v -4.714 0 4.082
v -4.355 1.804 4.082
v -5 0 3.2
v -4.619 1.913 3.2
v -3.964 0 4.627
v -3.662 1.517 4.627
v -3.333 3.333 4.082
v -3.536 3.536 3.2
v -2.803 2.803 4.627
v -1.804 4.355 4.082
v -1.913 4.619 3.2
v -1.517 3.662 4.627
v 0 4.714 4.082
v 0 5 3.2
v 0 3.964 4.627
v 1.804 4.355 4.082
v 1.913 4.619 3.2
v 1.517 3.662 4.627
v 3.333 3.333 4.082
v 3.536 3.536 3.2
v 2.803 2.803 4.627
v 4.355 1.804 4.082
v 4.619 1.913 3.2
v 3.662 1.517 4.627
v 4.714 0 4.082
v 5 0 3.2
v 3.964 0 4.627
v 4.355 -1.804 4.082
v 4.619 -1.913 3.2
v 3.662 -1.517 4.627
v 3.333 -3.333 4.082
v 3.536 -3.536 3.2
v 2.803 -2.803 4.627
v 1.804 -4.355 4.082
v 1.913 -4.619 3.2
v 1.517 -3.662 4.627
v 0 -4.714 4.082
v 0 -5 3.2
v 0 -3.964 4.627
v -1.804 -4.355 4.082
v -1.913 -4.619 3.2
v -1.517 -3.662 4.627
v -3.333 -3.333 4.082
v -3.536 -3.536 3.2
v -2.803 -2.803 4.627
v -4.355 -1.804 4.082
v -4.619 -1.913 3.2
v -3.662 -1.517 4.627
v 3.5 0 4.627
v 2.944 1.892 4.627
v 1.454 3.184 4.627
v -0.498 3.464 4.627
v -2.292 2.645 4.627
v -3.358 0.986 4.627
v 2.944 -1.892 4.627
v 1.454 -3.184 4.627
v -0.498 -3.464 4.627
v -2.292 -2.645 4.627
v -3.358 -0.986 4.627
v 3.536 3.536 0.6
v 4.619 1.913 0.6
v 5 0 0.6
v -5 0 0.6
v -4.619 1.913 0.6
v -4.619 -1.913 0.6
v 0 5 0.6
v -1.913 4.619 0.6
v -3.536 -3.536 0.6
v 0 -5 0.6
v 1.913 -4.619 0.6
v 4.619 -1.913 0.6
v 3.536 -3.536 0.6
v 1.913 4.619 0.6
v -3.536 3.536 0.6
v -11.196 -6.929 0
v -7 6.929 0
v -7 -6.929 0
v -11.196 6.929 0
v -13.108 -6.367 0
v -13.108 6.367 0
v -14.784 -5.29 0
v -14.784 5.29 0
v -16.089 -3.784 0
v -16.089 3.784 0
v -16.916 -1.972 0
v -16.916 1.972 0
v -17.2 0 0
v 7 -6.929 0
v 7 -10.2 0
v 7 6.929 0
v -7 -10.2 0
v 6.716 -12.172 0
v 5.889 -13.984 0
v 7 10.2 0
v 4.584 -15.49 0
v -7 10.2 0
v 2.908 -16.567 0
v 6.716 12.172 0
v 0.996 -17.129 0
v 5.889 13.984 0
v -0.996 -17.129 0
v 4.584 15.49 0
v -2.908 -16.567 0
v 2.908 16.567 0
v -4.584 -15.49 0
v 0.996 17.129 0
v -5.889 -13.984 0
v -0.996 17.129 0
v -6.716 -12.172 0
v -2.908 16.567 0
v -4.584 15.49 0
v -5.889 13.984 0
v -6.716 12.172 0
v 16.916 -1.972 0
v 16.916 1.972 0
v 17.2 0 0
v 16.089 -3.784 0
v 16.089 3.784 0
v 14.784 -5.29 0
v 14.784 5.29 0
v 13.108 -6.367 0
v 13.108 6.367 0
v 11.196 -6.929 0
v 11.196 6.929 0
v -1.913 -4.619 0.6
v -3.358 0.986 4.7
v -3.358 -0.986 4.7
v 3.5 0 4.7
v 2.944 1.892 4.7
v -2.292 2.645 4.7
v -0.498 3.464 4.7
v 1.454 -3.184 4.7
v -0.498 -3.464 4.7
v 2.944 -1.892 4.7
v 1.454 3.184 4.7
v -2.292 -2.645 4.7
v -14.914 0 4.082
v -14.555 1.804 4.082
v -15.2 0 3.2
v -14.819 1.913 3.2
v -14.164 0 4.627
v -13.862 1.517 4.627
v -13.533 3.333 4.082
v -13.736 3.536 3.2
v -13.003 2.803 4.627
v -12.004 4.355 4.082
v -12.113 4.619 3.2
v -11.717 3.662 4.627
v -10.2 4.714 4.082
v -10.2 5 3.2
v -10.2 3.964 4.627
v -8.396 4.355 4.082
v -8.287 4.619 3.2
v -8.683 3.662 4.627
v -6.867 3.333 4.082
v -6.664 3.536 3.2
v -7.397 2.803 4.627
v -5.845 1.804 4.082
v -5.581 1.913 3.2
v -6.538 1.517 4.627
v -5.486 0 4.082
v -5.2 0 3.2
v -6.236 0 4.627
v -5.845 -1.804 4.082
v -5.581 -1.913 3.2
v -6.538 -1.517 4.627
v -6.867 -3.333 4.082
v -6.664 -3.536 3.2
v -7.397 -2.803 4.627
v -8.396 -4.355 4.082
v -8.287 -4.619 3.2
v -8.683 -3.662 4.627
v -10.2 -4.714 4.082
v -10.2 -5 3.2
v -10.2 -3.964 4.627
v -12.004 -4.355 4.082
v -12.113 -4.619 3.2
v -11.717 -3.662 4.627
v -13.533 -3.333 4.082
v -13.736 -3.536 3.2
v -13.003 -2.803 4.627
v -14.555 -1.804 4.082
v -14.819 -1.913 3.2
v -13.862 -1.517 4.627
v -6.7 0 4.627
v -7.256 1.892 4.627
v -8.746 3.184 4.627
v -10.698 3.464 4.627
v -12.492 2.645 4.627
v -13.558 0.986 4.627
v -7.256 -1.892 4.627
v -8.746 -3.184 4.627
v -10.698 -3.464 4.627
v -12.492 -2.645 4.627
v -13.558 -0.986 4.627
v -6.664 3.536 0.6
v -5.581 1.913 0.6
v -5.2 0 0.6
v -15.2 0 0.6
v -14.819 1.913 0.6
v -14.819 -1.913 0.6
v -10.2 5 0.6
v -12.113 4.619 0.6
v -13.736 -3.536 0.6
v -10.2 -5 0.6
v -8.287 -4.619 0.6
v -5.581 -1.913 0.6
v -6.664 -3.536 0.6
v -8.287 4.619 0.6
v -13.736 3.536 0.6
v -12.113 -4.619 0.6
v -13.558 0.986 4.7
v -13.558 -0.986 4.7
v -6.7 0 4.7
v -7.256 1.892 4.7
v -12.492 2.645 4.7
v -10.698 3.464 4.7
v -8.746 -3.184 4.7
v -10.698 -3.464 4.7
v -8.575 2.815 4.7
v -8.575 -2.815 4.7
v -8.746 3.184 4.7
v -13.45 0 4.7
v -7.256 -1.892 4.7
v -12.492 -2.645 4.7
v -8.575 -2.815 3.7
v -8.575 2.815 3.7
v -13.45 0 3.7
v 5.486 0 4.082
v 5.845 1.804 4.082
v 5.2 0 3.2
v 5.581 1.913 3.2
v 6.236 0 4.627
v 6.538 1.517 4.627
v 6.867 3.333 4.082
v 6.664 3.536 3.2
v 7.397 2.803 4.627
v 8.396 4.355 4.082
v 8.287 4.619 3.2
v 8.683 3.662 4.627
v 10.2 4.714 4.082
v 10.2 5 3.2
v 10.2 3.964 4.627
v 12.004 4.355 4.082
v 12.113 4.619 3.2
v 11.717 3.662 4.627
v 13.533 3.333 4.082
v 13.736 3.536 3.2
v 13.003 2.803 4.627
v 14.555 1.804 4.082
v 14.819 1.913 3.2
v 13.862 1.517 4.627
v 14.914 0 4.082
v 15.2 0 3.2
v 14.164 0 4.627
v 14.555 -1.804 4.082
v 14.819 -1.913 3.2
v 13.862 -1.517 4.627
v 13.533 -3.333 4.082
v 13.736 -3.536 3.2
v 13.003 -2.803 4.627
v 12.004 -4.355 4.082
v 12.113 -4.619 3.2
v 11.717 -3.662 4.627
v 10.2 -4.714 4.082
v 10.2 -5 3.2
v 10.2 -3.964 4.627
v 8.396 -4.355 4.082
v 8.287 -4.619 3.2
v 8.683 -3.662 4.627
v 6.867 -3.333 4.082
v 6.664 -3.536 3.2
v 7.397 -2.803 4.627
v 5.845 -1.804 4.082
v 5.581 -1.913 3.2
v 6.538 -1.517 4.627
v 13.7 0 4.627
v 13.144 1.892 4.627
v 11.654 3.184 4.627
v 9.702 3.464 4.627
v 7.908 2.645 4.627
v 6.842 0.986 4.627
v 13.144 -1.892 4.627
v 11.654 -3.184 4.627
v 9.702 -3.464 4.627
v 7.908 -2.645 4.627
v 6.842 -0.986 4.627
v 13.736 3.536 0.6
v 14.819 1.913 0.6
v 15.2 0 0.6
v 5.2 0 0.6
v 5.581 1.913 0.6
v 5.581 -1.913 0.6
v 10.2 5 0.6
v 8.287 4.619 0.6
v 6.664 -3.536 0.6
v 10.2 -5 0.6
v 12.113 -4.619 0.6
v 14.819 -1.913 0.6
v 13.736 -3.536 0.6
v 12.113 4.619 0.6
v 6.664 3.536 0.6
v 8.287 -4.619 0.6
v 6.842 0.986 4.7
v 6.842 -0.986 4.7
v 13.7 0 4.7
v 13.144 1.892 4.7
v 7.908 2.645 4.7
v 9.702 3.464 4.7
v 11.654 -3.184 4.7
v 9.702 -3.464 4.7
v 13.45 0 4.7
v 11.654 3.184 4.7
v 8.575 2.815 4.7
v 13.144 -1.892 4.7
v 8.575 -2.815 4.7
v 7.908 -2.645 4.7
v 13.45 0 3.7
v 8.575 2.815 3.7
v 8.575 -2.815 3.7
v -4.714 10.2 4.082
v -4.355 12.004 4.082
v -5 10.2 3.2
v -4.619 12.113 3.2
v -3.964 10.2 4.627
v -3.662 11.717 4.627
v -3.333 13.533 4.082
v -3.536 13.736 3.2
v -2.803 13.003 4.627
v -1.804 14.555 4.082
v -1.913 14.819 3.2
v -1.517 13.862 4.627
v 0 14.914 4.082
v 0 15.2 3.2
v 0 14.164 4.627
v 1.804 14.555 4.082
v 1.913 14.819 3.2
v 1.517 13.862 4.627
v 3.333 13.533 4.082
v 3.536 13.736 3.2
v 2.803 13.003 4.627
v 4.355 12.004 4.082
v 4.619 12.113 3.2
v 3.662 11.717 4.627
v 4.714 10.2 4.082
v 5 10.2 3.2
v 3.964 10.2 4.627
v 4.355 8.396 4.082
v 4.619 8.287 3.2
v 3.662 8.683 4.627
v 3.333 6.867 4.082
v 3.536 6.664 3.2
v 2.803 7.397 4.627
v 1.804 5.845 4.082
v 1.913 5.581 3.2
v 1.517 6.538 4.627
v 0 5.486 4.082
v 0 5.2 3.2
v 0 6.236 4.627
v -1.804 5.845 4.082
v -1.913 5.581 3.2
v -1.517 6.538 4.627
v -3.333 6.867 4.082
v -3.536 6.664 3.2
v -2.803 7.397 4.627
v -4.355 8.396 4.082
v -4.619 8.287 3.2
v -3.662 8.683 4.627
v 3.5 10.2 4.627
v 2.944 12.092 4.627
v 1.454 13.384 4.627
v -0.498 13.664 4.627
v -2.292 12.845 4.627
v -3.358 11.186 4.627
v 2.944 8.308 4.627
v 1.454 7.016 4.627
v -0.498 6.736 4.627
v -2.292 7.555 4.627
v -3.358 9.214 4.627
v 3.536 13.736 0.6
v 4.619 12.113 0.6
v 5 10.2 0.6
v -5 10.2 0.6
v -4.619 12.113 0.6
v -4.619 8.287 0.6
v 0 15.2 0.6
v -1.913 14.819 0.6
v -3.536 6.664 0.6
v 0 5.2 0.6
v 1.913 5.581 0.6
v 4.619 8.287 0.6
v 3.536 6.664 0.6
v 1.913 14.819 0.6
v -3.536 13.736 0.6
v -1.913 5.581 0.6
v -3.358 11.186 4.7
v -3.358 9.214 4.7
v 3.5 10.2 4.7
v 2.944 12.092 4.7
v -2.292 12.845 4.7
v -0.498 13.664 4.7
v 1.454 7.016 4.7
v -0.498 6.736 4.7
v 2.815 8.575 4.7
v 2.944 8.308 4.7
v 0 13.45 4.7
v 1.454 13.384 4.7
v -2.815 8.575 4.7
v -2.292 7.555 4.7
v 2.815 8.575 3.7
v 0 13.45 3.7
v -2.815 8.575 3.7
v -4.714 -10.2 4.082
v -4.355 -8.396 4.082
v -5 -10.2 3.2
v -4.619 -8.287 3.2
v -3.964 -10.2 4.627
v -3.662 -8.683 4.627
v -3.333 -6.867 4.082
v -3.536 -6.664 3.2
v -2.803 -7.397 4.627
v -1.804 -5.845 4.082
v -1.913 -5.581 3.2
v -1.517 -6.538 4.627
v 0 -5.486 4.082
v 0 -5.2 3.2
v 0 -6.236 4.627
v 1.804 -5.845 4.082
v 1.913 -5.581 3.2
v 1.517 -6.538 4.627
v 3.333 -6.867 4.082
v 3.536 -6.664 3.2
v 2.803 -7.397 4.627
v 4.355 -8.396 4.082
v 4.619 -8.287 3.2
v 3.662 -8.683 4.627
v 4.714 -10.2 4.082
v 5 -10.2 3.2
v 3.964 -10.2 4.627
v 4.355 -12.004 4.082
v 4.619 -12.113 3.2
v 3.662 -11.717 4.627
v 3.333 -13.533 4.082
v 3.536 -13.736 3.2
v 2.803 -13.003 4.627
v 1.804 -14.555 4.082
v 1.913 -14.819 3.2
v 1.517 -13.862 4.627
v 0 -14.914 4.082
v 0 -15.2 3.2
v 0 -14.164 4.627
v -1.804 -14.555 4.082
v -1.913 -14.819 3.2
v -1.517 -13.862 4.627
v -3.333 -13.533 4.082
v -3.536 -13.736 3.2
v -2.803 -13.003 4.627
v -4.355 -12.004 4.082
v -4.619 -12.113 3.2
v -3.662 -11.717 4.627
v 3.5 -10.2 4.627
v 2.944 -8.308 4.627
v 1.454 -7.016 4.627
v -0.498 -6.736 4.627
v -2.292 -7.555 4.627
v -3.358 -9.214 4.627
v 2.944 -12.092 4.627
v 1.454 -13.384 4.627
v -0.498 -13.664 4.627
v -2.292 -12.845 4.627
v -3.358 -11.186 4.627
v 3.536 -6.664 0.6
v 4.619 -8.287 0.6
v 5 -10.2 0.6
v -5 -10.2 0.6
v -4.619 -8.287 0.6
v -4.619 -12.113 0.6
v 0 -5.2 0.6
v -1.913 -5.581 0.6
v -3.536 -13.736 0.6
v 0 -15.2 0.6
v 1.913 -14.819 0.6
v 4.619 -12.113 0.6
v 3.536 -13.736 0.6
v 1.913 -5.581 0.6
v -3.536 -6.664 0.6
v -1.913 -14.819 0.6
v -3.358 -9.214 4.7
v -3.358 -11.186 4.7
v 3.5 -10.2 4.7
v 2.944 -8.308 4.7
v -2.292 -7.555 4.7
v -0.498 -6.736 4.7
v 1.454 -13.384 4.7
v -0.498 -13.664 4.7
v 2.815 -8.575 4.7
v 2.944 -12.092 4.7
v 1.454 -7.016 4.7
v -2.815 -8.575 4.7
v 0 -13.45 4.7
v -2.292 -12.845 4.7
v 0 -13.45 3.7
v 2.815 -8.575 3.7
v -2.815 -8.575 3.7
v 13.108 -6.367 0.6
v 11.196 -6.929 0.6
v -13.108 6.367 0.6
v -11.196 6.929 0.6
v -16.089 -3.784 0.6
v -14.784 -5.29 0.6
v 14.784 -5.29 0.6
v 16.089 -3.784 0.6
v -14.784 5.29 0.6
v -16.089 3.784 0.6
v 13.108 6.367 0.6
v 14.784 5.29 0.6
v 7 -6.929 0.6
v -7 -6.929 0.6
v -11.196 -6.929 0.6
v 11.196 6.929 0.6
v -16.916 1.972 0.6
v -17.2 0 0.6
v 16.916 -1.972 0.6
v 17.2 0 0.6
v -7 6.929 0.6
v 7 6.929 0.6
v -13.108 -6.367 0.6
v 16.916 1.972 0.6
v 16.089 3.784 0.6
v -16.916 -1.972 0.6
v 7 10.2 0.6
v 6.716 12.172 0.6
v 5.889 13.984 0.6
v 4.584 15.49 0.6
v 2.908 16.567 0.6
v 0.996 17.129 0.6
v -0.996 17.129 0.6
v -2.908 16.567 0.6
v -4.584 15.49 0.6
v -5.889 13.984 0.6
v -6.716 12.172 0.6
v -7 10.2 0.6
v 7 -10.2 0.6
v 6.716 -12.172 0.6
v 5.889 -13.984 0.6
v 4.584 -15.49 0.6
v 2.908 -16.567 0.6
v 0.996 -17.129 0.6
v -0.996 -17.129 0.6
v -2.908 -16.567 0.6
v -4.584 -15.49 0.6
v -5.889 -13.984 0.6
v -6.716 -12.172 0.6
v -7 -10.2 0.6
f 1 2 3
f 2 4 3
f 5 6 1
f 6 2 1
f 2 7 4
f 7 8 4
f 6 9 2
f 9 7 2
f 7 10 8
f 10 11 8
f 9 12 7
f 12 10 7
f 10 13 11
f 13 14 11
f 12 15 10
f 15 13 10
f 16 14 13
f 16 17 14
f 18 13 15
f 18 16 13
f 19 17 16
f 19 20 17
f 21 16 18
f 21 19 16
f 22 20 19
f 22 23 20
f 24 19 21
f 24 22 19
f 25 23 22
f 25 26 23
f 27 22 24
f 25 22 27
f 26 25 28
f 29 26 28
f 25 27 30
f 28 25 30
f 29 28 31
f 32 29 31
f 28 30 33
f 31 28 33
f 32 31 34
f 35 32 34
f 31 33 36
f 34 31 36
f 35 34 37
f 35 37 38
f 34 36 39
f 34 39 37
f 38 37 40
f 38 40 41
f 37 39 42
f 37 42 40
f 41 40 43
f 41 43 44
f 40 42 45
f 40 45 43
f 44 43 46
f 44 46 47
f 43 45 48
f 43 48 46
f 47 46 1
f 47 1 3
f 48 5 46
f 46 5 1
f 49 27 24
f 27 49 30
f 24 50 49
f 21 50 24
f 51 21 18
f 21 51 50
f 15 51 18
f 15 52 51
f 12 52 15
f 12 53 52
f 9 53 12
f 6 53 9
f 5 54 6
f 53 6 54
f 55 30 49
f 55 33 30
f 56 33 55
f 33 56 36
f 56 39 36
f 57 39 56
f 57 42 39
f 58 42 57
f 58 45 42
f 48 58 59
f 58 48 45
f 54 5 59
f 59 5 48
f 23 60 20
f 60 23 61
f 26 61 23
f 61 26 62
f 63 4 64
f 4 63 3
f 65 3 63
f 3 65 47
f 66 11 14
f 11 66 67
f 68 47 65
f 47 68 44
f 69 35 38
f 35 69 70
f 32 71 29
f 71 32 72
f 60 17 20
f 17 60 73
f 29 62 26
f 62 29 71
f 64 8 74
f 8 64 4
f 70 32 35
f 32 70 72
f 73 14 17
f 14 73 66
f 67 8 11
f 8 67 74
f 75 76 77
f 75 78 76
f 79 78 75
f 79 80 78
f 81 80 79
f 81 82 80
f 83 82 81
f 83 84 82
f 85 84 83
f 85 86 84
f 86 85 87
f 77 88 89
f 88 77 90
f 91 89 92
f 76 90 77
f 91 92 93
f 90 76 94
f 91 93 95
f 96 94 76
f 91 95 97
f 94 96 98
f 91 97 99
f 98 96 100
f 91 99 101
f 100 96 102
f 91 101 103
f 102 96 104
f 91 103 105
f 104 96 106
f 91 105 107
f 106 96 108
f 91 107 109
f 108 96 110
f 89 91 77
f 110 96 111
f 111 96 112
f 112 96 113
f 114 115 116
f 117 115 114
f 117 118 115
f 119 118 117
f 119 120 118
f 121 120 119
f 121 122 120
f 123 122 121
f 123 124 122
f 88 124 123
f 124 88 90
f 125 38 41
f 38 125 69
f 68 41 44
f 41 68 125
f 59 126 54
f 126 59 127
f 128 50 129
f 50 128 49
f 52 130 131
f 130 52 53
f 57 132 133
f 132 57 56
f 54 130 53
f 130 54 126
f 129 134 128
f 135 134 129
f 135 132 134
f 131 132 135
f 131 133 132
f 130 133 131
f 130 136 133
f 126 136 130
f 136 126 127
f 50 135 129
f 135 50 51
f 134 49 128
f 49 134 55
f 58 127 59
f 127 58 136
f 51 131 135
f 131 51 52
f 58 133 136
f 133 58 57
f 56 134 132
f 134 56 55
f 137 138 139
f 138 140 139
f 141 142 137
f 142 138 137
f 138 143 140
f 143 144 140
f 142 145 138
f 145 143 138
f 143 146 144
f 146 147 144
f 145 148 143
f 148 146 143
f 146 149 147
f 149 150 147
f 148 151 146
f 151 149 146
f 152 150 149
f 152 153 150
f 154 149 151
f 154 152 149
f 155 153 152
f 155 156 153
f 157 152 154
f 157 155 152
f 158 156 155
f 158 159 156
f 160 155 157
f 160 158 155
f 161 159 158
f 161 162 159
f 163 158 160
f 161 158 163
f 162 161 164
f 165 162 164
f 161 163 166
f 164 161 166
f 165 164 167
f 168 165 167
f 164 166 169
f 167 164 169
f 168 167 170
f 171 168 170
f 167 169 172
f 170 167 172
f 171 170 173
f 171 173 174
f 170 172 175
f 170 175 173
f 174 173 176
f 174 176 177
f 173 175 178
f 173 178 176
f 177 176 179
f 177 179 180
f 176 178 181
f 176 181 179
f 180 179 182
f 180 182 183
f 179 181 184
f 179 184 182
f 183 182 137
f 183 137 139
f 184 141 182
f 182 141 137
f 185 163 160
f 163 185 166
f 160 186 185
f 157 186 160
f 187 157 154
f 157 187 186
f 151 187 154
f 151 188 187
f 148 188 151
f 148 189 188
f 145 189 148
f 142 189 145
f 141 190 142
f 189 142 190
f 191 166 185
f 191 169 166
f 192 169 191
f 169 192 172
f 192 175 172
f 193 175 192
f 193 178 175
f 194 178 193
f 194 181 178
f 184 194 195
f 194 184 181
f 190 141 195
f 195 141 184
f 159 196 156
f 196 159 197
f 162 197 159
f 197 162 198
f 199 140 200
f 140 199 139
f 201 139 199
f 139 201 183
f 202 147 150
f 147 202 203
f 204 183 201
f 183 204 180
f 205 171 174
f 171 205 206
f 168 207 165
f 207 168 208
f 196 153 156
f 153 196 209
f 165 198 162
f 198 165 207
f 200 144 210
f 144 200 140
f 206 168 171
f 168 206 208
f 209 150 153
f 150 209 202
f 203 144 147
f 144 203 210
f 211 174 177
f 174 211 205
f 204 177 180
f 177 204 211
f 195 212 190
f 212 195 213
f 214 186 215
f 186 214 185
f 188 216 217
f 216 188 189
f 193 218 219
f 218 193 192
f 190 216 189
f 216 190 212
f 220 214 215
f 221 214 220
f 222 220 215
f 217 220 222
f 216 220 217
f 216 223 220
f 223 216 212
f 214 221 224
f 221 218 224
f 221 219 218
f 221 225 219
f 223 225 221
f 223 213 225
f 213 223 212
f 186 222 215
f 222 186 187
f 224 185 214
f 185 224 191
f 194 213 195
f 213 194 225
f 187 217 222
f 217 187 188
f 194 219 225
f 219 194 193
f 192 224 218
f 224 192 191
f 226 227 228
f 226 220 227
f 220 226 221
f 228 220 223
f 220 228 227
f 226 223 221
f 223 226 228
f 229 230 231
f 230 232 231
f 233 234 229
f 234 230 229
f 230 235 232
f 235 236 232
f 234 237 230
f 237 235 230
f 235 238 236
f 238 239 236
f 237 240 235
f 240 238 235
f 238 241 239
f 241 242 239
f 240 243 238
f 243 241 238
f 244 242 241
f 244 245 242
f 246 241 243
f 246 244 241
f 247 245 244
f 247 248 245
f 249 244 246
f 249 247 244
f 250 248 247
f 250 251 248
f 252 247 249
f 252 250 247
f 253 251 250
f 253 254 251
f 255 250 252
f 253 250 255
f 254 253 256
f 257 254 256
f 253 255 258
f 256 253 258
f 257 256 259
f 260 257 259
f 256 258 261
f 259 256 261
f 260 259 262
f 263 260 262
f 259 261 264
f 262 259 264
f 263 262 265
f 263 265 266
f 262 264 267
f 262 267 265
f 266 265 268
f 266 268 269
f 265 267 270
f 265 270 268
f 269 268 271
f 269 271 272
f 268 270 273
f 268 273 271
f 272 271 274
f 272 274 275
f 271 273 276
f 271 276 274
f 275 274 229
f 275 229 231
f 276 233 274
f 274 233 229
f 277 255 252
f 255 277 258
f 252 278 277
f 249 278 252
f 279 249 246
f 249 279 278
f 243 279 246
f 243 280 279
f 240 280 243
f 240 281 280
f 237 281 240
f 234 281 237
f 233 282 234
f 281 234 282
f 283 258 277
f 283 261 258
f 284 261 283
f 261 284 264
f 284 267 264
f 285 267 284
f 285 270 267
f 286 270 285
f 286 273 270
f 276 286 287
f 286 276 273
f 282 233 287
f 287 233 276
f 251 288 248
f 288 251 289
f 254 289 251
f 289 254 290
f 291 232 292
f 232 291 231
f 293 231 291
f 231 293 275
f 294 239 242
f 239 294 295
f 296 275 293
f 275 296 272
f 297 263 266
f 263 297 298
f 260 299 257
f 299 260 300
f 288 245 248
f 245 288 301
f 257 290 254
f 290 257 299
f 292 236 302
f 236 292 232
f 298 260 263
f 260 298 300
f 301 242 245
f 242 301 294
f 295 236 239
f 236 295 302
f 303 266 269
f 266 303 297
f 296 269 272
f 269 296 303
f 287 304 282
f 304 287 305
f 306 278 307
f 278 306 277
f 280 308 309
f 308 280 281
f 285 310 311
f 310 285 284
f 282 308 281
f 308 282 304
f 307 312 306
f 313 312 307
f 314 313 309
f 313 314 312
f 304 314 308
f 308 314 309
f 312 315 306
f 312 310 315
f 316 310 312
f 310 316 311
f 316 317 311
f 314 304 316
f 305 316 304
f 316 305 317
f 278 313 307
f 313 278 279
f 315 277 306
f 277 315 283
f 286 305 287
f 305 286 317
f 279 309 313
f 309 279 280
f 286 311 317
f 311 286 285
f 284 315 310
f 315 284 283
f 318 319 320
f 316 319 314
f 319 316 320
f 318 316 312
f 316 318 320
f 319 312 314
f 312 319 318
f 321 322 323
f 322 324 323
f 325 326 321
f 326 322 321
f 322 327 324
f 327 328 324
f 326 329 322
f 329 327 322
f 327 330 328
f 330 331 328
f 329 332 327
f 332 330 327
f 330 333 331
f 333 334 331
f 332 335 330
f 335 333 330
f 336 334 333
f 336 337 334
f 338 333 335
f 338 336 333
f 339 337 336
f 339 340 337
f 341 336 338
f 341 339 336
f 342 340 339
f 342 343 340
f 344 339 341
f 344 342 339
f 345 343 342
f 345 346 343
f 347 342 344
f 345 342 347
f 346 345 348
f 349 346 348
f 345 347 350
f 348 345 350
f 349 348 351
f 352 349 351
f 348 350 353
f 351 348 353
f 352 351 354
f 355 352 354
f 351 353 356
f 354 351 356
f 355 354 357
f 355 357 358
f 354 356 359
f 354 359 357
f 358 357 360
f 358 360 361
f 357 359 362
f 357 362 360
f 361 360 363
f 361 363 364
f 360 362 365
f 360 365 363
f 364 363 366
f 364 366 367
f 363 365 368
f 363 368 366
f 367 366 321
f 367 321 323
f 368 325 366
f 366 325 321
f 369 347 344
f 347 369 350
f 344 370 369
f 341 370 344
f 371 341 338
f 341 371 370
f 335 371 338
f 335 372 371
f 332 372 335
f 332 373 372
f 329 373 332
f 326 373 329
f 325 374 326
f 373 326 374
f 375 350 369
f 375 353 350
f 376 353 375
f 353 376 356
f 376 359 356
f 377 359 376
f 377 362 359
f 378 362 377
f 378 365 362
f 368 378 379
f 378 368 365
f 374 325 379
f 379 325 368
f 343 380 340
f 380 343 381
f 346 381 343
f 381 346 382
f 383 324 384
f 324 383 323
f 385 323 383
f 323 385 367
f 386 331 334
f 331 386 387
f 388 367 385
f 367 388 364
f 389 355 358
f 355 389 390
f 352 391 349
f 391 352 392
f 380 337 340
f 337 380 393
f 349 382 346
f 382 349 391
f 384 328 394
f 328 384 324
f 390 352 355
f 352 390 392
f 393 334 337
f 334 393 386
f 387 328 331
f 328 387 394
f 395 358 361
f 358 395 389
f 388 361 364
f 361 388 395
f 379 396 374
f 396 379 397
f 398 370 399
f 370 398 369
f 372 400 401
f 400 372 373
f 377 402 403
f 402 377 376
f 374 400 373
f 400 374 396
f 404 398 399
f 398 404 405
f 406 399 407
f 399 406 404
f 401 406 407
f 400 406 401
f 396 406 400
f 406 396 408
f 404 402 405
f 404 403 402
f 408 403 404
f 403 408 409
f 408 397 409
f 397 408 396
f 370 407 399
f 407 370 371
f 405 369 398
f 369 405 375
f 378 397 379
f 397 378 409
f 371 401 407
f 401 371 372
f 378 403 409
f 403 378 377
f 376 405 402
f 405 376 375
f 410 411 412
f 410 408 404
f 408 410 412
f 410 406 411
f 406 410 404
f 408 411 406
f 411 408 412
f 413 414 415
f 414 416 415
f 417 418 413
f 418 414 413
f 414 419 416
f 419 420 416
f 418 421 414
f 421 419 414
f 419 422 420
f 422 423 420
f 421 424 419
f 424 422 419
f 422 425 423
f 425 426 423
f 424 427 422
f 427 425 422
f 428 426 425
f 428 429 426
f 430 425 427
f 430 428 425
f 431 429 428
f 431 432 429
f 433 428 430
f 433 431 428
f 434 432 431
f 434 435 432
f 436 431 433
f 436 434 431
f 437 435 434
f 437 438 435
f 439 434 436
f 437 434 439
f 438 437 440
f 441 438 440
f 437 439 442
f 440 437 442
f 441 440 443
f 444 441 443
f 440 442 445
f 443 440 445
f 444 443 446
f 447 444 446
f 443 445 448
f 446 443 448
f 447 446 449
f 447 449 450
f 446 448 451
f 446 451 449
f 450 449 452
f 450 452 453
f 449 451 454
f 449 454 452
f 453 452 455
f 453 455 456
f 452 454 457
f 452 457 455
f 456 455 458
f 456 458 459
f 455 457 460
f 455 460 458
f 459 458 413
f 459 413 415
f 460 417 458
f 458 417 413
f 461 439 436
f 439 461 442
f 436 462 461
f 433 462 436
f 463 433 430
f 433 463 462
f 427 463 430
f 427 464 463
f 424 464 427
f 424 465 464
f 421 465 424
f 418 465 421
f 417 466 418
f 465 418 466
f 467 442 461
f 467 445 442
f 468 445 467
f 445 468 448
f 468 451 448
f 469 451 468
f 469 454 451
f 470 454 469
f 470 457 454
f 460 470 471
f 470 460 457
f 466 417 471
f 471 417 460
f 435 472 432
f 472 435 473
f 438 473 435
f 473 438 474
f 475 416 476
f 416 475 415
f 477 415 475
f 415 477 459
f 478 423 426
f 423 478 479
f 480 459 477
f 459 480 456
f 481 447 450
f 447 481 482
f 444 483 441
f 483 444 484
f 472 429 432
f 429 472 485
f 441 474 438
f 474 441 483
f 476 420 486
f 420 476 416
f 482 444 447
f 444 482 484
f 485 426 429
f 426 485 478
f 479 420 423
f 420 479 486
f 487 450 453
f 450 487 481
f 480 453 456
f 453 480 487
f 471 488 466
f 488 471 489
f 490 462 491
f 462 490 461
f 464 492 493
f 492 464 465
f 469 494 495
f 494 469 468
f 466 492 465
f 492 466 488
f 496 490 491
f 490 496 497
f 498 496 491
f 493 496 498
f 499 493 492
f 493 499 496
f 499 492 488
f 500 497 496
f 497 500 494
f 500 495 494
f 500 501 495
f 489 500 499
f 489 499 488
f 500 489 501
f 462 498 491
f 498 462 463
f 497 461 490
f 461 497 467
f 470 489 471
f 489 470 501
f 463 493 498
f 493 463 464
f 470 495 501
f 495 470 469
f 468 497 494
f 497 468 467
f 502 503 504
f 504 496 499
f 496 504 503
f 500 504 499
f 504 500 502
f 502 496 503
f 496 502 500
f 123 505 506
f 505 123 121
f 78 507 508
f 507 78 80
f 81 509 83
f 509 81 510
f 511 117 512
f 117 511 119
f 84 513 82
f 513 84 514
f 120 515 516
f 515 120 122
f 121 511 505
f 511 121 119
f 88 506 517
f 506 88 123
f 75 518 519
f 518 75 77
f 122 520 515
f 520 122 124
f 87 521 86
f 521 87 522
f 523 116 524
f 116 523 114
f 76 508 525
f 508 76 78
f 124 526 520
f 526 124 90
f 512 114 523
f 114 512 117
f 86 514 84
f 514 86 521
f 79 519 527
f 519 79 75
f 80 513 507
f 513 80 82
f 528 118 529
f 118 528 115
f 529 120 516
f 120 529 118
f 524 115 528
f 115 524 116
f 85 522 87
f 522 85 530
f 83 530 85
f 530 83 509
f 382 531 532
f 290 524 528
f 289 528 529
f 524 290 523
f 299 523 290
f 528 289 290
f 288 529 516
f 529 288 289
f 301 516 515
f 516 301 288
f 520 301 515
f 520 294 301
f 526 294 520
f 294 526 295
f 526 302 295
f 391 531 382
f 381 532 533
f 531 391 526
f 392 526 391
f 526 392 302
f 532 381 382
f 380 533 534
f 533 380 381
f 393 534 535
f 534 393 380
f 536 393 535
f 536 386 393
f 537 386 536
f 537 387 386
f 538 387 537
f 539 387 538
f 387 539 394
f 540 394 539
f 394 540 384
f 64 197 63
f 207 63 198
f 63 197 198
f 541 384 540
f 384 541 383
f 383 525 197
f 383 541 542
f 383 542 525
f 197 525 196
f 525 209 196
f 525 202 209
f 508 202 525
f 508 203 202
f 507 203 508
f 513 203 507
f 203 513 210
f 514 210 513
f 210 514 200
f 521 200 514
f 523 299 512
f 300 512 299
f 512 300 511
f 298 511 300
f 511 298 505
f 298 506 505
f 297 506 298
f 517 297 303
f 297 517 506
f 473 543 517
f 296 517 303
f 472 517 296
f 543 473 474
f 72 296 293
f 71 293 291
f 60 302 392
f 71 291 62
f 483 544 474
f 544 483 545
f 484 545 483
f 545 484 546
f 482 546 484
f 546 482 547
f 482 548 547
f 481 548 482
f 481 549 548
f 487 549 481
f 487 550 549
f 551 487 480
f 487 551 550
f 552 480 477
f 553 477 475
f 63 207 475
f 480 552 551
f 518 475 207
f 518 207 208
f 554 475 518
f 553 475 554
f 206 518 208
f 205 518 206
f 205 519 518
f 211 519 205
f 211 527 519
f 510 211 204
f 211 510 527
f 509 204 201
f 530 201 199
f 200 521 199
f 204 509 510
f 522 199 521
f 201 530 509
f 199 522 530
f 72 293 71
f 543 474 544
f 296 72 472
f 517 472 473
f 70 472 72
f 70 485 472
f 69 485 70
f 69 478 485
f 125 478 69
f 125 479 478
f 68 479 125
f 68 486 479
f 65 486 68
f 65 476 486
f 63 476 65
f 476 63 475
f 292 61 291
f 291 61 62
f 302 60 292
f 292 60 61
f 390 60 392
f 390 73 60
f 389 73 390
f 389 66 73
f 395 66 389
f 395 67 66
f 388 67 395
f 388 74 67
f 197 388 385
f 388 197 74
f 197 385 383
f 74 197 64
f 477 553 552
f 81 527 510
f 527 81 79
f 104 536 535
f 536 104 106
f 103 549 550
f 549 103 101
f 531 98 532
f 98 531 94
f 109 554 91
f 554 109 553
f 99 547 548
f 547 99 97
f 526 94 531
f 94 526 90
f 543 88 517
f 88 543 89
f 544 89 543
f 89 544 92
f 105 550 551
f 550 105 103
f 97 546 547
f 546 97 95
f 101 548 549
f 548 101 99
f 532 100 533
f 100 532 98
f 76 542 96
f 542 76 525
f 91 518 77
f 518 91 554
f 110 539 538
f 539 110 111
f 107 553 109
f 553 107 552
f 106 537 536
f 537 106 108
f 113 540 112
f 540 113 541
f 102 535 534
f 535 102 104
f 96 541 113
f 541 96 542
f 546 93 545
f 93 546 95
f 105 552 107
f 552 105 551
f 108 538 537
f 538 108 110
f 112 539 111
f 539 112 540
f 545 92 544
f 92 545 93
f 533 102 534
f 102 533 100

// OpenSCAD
// file: tvRemoteControl-Buttons.scad
pitch=2.55;
width = 10;
thickness=0.6;
height=thickness + 4.1;
extra=2;
roundness=1.5;
textHeight=1;

module button(x,y)
{
    translate( [x*pitch, y*pitch] ) {
        difference() {
            union() {
                translate( [0,0,height-roundness] ) rotate_extrude( angle = 360, convexity = 6 ) {
                    translate( [width/2-roundness,0] ) circle( r=roundness, $fn=10 );
                }
                cylinder( d=width, h=height-roundness );
                cylinder( d=width-roundness*2, h=height );
            }
            translate( [0,0,height-textHeight] ) linear_extrude( textHeight+1 ) children();
        }
    }
}

module base(x,y)
{
    translate( [x*pitch, y*pitch] ) {
        cylinder( d=width+extra*2, thickness );
    }
}

module letter( t )
{
    text( t=t, halign="center", valign="center" );
}

module arrow()
{
    circle( d= width-roundness-2, $fn=3 );
}

module minus()
{
    square( [width-roundness-2, 2], center=true );
}

module plus()
{
    minus();
    rotate( 90 ) minus();
}
// main file
use <tvRemoteControl-Buttons.scad>;


module arrows()
{
    button(0,0) letter("ok");
    button(-4,0) rotate(180) arrow();
    button(4,0) arrow();
    button(0,4) rotate(90) arrow();
    button(0,-4) rotate(-90) arrow();
    
    hull() {
        base(4,0);
        base(-4,0);
    }
    hull() {
        base(0,4);
        base(0,-4);
    }
}

arrows();
